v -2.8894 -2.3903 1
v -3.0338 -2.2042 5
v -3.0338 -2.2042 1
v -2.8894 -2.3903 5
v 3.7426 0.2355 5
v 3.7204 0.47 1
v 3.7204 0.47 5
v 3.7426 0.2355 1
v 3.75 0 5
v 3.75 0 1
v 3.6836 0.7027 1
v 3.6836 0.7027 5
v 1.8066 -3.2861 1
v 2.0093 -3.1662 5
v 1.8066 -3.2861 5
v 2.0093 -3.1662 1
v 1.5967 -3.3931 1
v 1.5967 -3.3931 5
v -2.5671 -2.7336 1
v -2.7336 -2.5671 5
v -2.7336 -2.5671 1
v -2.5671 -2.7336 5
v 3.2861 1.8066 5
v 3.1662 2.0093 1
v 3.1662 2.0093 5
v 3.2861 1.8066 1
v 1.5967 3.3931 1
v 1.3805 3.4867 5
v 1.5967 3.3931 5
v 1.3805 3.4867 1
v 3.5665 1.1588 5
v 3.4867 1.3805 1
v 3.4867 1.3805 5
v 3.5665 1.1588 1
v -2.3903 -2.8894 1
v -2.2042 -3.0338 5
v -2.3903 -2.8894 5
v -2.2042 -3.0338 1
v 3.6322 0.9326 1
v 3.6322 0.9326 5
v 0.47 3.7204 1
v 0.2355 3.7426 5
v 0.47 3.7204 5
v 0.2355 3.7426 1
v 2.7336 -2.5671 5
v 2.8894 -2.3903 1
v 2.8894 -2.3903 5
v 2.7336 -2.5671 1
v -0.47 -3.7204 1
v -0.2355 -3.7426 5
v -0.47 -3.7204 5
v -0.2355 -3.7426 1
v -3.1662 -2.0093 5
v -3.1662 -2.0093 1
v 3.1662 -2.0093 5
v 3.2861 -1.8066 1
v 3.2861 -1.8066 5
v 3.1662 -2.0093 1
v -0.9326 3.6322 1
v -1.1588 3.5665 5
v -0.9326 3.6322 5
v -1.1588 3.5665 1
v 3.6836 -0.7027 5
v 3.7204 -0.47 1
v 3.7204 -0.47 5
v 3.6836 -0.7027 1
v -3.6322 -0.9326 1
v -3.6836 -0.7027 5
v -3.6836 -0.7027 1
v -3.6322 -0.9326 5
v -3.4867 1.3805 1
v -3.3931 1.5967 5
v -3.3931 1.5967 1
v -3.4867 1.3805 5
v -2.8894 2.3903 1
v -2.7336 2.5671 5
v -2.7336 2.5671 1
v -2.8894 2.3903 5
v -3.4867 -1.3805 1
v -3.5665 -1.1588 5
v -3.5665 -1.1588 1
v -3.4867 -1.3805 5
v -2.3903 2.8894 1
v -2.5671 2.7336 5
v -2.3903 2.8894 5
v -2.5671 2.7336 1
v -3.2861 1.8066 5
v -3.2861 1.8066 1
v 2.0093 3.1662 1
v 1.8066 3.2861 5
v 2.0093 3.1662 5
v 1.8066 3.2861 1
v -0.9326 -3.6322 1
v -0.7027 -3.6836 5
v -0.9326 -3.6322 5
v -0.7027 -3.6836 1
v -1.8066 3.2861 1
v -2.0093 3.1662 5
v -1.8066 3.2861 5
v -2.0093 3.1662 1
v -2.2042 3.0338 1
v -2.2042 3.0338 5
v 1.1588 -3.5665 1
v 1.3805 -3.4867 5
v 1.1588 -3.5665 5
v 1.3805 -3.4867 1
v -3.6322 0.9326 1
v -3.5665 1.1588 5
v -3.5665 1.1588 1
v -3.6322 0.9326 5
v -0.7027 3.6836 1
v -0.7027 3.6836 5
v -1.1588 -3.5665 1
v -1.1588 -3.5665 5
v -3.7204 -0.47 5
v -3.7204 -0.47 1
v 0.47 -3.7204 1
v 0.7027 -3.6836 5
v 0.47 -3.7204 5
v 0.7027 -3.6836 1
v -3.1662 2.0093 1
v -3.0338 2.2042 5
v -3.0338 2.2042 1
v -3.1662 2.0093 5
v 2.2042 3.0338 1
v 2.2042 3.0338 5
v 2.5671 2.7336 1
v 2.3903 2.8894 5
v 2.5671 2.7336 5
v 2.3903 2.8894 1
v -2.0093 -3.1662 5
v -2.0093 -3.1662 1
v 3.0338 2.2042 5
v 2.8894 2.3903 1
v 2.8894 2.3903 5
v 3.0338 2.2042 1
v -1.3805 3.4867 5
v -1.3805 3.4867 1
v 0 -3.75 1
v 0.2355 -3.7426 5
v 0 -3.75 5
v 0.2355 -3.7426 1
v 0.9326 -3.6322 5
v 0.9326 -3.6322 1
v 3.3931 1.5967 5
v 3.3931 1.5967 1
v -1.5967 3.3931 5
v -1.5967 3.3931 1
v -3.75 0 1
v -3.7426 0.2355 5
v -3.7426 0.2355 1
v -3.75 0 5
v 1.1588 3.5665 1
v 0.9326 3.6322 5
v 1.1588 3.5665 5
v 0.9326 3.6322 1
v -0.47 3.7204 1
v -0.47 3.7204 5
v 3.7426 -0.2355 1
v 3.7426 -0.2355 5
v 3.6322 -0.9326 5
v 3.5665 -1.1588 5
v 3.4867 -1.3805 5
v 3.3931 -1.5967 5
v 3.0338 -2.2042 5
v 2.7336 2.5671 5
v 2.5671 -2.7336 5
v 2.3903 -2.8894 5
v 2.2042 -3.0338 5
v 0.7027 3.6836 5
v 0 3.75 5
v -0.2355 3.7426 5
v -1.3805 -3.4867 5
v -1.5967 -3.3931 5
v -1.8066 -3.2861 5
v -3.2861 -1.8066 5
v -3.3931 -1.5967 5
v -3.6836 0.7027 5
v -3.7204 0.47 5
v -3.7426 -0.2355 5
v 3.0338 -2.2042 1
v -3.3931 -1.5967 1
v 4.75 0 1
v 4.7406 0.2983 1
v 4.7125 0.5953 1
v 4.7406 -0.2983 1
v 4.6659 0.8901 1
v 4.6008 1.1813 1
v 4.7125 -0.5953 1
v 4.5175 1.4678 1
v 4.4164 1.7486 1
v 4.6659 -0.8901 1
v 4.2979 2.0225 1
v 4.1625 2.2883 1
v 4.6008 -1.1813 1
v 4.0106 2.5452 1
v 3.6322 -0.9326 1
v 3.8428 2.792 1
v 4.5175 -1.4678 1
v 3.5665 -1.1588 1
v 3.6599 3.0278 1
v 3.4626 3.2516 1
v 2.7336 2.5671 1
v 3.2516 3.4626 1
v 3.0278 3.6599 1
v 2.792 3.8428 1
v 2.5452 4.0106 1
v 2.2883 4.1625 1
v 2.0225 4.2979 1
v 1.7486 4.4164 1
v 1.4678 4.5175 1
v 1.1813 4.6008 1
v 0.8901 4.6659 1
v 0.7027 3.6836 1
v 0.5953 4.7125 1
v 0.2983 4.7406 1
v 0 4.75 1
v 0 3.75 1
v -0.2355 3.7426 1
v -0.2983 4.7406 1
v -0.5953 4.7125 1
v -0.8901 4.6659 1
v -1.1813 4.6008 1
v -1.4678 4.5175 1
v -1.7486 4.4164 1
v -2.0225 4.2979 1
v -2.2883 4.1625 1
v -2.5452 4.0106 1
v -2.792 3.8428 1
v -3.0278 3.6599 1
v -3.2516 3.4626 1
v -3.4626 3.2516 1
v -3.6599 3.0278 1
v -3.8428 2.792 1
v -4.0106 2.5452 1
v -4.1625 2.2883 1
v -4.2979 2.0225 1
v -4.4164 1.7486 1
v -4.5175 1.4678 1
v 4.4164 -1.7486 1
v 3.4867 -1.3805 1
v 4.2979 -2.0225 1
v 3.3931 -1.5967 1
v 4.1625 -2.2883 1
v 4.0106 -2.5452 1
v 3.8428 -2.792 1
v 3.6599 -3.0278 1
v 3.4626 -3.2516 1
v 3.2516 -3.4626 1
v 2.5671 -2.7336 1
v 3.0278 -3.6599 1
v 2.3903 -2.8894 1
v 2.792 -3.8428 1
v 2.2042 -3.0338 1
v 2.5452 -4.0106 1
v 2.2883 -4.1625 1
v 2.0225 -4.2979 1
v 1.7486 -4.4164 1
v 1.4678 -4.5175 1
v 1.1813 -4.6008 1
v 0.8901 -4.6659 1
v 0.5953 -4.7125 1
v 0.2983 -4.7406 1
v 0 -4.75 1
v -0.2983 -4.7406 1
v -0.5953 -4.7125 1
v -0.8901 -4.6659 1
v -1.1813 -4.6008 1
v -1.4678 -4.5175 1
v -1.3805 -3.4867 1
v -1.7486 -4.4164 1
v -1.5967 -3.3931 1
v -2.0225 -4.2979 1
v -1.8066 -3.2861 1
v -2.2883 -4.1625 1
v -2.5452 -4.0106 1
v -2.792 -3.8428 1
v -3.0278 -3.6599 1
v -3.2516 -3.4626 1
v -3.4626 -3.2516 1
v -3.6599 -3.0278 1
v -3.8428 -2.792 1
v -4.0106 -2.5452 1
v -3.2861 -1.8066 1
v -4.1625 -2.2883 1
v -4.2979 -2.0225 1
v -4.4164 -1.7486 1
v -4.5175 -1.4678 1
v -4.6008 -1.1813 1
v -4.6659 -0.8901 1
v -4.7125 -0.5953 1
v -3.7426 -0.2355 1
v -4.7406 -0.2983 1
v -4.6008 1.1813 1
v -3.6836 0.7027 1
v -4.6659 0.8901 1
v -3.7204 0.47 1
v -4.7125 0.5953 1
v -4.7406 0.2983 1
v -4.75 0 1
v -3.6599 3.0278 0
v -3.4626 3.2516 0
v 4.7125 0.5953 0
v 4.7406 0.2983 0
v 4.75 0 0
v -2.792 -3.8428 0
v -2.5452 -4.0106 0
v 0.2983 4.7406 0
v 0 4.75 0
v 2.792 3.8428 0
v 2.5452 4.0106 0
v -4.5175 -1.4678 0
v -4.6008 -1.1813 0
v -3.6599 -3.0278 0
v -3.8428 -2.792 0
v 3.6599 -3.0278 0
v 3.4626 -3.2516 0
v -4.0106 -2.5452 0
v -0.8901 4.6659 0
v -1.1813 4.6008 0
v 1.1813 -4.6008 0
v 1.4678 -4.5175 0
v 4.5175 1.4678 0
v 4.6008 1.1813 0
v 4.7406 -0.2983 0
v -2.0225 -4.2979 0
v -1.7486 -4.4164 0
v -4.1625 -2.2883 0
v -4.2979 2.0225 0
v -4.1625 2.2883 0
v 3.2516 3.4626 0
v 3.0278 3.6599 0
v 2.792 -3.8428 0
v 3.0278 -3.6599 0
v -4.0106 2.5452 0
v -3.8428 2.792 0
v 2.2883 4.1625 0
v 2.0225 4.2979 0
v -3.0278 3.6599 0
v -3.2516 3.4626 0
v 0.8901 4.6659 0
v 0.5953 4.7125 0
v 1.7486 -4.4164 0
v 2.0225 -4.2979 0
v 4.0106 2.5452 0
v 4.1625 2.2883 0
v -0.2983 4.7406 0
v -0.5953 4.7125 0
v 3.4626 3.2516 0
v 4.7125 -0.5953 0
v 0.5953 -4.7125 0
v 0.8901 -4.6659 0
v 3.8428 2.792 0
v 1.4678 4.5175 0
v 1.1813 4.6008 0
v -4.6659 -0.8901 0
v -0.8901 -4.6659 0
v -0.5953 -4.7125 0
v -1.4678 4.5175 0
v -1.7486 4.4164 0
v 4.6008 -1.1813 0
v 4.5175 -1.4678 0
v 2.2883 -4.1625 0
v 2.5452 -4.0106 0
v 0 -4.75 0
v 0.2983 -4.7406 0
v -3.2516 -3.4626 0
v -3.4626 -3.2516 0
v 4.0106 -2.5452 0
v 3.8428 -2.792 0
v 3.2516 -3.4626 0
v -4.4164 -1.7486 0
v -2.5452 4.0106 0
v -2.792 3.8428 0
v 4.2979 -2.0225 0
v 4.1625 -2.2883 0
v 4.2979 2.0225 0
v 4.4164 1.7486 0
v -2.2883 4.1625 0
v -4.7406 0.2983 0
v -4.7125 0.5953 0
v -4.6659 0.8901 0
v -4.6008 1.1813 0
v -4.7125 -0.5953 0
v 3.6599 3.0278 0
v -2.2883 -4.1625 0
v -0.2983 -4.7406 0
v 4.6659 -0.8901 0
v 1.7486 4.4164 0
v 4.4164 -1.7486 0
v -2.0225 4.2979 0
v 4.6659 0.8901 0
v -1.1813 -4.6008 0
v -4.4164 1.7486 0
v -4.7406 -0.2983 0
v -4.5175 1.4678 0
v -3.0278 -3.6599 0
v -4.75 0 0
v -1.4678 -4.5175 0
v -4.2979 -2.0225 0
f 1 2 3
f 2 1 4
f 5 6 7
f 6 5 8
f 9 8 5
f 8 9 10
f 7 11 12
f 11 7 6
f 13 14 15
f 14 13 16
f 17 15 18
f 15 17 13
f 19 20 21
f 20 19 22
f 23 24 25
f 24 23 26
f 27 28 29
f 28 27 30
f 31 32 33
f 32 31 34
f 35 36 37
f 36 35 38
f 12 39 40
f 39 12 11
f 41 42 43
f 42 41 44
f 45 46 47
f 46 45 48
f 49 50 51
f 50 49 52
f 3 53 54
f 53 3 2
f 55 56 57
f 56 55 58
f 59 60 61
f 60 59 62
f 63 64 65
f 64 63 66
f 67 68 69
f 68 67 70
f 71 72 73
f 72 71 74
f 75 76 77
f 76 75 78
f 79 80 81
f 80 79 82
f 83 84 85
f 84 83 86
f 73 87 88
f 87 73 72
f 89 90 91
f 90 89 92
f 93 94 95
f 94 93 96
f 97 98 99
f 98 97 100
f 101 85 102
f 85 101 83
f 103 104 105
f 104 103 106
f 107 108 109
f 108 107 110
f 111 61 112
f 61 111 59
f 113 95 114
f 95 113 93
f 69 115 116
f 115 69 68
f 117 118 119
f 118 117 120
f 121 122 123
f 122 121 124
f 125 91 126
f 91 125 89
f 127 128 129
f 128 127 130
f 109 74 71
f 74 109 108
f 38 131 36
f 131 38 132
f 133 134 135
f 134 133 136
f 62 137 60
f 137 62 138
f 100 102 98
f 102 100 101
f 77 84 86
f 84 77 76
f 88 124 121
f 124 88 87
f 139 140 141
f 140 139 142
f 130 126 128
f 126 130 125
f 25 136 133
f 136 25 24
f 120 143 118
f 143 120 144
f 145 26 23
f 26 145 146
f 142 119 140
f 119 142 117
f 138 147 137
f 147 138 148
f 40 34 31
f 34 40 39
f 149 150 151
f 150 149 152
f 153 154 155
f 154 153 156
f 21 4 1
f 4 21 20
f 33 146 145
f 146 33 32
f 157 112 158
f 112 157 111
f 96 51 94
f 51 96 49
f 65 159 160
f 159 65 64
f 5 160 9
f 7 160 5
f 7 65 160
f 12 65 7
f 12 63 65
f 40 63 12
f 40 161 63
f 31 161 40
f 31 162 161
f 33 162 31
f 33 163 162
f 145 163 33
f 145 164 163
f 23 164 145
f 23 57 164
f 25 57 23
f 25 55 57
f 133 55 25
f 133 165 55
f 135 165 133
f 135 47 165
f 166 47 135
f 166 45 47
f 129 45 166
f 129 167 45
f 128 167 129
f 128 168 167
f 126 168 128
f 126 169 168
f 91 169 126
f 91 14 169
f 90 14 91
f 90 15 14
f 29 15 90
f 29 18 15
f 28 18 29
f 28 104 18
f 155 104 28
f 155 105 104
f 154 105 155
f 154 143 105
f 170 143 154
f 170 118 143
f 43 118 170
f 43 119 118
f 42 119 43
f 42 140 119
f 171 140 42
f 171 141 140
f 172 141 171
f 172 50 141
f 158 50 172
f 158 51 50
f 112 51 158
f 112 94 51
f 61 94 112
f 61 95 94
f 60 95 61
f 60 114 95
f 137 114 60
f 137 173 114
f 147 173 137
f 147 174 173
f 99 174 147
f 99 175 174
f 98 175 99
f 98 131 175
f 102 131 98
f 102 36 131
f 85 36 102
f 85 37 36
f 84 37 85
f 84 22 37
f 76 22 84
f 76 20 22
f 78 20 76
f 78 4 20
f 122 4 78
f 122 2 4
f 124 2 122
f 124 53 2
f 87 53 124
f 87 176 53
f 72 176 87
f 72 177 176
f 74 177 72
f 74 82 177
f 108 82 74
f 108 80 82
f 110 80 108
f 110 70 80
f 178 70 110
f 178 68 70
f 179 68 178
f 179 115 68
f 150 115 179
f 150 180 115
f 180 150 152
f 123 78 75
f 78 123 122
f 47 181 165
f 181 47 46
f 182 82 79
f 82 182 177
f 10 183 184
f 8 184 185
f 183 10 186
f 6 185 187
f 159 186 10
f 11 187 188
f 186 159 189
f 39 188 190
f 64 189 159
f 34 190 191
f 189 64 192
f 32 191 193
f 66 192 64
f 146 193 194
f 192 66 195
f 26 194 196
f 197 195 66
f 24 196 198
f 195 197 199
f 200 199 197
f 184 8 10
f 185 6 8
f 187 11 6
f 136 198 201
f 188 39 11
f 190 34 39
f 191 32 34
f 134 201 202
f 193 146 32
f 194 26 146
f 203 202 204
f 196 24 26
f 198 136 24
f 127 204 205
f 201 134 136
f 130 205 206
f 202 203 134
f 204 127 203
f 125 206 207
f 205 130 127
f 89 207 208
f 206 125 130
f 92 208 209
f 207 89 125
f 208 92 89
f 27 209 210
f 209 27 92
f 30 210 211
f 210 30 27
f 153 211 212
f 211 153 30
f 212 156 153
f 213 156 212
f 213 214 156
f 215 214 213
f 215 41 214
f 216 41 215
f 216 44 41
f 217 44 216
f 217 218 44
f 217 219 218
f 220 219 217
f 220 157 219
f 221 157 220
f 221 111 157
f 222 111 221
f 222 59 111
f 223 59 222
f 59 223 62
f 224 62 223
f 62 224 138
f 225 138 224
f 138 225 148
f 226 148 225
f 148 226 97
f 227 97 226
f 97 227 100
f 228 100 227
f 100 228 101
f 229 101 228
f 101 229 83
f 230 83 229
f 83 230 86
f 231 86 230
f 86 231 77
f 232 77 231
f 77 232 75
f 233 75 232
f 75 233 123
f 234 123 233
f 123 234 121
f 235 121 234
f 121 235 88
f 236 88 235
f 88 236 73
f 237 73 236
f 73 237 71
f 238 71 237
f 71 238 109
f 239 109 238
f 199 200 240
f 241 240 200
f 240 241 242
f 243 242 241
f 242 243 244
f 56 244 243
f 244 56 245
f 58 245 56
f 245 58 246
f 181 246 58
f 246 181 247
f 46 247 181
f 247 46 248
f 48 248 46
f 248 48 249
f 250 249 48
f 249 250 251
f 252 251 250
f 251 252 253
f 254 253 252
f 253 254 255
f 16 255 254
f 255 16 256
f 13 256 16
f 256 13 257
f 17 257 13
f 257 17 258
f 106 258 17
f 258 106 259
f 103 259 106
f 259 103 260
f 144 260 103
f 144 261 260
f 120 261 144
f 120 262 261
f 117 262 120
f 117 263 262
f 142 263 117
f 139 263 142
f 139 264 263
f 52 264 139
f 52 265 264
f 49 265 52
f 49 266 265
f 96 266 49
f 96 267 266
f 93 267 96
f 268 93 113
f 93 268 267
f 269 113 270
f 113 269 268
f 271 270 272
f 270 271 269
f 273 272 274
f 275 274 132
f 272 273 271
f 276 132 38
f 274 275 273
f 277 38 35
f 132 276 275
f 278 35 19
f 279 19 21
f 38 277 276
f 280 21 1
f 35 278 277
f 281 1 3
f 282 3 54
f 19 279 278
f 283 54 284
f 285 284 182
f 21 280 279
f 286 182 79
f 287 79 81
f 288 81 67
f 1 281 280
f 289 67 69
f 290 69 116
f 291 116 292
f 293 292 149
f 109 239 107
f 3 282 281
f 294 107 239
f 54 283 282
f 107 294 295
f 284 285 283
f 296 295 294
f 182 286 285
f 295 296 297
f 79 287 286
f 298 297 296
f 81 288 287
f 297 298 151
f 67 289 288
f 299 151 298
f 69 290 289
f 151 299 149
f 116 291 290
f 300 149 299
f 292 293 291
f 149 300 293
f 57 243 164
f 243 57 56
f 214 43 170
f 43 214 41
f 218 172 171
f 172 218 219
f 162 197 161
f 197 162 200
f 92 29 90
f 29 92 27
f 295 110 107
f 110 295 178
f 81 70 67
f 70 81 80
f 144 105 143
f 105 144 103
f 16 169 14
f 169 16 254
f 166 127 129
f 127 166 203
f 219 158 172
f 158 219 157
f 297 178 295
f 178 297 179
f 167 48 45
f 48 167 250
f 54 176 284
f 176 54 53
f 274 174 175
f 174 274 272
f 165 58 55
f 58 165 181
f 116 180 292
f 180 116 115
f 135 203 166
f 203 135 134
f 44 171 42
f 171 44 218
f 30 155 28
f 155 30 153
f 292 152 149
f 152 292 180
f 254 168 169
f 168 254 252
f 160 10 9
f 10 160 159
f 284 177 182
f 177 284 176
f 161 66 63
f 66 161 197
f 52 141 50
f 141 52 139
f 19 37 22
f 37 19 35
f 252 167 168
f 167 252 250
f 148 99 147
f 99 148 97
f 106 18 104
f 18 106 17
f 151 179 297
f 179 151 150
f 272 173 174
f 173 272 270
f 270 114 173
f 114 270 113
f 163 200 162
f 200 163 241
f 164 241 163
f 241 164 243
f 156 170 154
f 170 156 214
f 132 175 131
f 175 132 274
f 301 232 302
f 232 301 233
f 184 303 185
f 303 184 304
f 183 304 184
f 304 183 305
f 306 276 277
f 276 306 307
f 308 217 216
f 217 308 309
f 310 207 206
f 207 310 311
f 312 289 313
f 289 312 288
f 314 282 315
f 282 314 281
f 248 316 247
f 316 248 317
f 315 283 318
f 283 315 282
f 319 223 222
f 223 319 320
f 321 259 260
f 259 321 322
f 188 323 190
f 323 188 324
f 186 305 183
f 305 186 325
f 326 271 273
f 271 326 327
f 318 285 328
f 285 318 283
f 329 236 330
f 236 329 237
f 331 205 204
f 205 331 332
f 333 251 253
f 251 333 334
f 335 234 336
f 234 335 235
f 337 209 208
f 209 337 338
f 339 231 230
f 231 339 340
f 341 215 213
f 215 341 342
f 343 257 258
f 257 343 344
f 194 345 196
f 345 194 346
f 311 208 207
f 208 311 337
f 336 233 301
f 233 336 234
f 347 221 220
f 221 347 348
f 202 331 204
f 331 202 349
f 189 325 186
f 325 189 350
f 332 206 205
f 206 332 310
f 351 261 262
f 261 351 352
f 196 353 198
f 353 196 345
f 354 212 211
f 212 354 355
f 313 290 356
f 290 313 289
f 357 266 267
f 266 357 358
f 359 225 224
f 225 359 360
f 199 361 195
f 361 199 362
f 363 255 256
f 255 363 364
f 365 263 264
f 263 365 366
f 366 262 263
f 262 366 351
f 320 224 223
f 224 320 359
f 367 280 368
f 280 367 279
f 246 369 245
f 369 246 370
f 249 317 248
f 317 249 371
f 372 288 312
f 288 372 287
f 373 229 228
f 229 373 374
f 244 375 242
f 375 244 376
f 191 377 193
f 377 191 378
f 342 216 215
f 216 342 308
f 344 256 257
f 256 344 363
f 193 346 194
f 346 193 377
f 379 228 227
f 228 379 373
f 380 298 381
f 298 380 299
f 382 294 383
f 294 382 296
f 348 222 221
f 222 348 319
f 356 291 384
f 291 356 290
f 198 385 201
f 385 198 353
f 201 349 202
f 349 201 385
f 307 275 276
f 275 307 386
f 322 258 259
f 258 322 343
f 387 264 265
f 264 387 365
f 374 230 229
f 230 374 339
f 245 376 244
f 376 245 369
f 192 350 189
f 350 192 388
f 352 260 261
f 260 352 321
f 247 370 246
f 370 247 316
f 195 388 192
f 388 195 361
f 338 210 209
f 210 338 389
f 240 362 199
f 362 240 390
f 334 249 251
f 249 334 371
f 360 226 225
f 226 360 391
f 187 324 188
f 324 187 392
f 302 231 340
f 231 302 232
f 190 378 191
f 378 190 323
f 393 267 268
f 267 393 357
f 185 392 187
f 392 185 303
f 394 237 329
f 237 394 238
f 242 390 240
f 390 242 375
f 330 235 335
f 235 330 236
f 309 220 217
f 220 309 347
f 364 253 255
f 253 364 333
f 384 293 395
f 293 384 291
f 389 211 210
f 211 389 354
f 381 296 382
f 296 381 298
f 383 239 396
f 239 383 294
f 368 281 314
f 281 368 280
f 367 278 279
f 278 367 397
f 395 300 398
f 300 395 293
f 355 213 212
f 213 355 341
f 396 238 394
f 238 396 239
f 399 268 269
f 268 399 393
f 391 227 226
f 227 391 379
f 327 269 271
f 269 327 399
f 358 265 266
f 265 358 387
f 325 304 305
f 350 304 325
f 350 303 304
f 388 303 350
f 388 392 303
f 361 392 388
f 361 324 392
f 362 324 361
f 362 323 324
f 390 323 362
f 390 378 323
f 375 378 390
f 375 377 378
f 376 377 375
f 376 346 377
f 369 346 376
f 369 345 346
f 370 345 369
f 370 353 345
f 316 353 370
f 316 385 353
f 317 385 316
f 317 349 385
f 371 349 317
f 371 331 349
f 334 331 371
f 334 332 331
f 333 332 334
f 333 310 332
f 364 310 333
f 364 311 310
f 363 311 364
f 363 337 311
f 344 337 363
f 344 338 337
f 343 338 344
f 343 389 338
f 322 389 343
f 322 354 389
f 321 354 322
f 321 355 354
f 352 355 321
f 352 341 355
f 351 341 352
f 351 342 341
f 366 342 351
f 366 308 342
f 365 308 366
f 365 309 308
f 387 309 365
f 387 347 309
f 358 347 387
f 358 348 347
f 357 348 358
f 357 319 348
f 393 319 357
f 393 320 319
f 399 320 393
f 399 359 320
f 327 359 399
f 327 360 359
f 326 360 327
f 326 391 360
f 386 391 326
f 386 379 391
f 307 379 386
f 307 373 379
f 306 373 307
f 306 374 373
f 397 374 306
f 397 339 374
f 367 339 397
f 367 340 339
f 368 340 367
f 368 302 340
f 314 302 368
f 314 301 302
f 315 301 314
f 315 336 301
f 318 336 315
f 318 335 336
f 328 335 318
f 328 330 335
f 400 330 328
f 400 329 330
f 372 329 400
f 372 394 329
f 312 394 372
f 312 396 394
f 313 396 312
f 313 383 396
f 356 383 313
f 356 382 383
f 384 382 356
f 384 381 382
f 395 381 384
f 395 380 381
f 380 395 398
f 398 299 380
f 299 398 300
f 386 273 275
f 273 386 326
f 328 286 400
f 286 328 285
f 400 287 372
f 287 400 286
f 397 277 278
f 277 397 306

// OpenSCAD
// file: configurations.scad
// A and B Buttons
round_button_1_diameter = 7.5;
round_button_1_z_size = 4;
round_button_1_support_diameter = 9.5;
round_button_1_support_z_size = 1;
round_button_1_fn = 80;
// main file
include <./configurations.scad>

/**
 * roundButton
 * @name roundButton
 * @description Base method for creating buttons
 * @type Supbiece
 * @parent 
 */
module roundButton(
    diameter = round_button_1_diameter,
    button_z_size =round_button_1_z_size,
    support_diameter = round_button_1_support_diameter,
    support_z_size =round_button_1_support_z_size,
    $fn = round_button_1_fn
) {
    union() {
        translate([0, 0, support_z_size])
            cylinder(h = button_z_size, d = diameter, center = false, $fn = $fn);

        cylinder(h = support_z_size, d = support_diameter, center = false, $fn = $fn);
    }
}



roundButton($fn = 100);
